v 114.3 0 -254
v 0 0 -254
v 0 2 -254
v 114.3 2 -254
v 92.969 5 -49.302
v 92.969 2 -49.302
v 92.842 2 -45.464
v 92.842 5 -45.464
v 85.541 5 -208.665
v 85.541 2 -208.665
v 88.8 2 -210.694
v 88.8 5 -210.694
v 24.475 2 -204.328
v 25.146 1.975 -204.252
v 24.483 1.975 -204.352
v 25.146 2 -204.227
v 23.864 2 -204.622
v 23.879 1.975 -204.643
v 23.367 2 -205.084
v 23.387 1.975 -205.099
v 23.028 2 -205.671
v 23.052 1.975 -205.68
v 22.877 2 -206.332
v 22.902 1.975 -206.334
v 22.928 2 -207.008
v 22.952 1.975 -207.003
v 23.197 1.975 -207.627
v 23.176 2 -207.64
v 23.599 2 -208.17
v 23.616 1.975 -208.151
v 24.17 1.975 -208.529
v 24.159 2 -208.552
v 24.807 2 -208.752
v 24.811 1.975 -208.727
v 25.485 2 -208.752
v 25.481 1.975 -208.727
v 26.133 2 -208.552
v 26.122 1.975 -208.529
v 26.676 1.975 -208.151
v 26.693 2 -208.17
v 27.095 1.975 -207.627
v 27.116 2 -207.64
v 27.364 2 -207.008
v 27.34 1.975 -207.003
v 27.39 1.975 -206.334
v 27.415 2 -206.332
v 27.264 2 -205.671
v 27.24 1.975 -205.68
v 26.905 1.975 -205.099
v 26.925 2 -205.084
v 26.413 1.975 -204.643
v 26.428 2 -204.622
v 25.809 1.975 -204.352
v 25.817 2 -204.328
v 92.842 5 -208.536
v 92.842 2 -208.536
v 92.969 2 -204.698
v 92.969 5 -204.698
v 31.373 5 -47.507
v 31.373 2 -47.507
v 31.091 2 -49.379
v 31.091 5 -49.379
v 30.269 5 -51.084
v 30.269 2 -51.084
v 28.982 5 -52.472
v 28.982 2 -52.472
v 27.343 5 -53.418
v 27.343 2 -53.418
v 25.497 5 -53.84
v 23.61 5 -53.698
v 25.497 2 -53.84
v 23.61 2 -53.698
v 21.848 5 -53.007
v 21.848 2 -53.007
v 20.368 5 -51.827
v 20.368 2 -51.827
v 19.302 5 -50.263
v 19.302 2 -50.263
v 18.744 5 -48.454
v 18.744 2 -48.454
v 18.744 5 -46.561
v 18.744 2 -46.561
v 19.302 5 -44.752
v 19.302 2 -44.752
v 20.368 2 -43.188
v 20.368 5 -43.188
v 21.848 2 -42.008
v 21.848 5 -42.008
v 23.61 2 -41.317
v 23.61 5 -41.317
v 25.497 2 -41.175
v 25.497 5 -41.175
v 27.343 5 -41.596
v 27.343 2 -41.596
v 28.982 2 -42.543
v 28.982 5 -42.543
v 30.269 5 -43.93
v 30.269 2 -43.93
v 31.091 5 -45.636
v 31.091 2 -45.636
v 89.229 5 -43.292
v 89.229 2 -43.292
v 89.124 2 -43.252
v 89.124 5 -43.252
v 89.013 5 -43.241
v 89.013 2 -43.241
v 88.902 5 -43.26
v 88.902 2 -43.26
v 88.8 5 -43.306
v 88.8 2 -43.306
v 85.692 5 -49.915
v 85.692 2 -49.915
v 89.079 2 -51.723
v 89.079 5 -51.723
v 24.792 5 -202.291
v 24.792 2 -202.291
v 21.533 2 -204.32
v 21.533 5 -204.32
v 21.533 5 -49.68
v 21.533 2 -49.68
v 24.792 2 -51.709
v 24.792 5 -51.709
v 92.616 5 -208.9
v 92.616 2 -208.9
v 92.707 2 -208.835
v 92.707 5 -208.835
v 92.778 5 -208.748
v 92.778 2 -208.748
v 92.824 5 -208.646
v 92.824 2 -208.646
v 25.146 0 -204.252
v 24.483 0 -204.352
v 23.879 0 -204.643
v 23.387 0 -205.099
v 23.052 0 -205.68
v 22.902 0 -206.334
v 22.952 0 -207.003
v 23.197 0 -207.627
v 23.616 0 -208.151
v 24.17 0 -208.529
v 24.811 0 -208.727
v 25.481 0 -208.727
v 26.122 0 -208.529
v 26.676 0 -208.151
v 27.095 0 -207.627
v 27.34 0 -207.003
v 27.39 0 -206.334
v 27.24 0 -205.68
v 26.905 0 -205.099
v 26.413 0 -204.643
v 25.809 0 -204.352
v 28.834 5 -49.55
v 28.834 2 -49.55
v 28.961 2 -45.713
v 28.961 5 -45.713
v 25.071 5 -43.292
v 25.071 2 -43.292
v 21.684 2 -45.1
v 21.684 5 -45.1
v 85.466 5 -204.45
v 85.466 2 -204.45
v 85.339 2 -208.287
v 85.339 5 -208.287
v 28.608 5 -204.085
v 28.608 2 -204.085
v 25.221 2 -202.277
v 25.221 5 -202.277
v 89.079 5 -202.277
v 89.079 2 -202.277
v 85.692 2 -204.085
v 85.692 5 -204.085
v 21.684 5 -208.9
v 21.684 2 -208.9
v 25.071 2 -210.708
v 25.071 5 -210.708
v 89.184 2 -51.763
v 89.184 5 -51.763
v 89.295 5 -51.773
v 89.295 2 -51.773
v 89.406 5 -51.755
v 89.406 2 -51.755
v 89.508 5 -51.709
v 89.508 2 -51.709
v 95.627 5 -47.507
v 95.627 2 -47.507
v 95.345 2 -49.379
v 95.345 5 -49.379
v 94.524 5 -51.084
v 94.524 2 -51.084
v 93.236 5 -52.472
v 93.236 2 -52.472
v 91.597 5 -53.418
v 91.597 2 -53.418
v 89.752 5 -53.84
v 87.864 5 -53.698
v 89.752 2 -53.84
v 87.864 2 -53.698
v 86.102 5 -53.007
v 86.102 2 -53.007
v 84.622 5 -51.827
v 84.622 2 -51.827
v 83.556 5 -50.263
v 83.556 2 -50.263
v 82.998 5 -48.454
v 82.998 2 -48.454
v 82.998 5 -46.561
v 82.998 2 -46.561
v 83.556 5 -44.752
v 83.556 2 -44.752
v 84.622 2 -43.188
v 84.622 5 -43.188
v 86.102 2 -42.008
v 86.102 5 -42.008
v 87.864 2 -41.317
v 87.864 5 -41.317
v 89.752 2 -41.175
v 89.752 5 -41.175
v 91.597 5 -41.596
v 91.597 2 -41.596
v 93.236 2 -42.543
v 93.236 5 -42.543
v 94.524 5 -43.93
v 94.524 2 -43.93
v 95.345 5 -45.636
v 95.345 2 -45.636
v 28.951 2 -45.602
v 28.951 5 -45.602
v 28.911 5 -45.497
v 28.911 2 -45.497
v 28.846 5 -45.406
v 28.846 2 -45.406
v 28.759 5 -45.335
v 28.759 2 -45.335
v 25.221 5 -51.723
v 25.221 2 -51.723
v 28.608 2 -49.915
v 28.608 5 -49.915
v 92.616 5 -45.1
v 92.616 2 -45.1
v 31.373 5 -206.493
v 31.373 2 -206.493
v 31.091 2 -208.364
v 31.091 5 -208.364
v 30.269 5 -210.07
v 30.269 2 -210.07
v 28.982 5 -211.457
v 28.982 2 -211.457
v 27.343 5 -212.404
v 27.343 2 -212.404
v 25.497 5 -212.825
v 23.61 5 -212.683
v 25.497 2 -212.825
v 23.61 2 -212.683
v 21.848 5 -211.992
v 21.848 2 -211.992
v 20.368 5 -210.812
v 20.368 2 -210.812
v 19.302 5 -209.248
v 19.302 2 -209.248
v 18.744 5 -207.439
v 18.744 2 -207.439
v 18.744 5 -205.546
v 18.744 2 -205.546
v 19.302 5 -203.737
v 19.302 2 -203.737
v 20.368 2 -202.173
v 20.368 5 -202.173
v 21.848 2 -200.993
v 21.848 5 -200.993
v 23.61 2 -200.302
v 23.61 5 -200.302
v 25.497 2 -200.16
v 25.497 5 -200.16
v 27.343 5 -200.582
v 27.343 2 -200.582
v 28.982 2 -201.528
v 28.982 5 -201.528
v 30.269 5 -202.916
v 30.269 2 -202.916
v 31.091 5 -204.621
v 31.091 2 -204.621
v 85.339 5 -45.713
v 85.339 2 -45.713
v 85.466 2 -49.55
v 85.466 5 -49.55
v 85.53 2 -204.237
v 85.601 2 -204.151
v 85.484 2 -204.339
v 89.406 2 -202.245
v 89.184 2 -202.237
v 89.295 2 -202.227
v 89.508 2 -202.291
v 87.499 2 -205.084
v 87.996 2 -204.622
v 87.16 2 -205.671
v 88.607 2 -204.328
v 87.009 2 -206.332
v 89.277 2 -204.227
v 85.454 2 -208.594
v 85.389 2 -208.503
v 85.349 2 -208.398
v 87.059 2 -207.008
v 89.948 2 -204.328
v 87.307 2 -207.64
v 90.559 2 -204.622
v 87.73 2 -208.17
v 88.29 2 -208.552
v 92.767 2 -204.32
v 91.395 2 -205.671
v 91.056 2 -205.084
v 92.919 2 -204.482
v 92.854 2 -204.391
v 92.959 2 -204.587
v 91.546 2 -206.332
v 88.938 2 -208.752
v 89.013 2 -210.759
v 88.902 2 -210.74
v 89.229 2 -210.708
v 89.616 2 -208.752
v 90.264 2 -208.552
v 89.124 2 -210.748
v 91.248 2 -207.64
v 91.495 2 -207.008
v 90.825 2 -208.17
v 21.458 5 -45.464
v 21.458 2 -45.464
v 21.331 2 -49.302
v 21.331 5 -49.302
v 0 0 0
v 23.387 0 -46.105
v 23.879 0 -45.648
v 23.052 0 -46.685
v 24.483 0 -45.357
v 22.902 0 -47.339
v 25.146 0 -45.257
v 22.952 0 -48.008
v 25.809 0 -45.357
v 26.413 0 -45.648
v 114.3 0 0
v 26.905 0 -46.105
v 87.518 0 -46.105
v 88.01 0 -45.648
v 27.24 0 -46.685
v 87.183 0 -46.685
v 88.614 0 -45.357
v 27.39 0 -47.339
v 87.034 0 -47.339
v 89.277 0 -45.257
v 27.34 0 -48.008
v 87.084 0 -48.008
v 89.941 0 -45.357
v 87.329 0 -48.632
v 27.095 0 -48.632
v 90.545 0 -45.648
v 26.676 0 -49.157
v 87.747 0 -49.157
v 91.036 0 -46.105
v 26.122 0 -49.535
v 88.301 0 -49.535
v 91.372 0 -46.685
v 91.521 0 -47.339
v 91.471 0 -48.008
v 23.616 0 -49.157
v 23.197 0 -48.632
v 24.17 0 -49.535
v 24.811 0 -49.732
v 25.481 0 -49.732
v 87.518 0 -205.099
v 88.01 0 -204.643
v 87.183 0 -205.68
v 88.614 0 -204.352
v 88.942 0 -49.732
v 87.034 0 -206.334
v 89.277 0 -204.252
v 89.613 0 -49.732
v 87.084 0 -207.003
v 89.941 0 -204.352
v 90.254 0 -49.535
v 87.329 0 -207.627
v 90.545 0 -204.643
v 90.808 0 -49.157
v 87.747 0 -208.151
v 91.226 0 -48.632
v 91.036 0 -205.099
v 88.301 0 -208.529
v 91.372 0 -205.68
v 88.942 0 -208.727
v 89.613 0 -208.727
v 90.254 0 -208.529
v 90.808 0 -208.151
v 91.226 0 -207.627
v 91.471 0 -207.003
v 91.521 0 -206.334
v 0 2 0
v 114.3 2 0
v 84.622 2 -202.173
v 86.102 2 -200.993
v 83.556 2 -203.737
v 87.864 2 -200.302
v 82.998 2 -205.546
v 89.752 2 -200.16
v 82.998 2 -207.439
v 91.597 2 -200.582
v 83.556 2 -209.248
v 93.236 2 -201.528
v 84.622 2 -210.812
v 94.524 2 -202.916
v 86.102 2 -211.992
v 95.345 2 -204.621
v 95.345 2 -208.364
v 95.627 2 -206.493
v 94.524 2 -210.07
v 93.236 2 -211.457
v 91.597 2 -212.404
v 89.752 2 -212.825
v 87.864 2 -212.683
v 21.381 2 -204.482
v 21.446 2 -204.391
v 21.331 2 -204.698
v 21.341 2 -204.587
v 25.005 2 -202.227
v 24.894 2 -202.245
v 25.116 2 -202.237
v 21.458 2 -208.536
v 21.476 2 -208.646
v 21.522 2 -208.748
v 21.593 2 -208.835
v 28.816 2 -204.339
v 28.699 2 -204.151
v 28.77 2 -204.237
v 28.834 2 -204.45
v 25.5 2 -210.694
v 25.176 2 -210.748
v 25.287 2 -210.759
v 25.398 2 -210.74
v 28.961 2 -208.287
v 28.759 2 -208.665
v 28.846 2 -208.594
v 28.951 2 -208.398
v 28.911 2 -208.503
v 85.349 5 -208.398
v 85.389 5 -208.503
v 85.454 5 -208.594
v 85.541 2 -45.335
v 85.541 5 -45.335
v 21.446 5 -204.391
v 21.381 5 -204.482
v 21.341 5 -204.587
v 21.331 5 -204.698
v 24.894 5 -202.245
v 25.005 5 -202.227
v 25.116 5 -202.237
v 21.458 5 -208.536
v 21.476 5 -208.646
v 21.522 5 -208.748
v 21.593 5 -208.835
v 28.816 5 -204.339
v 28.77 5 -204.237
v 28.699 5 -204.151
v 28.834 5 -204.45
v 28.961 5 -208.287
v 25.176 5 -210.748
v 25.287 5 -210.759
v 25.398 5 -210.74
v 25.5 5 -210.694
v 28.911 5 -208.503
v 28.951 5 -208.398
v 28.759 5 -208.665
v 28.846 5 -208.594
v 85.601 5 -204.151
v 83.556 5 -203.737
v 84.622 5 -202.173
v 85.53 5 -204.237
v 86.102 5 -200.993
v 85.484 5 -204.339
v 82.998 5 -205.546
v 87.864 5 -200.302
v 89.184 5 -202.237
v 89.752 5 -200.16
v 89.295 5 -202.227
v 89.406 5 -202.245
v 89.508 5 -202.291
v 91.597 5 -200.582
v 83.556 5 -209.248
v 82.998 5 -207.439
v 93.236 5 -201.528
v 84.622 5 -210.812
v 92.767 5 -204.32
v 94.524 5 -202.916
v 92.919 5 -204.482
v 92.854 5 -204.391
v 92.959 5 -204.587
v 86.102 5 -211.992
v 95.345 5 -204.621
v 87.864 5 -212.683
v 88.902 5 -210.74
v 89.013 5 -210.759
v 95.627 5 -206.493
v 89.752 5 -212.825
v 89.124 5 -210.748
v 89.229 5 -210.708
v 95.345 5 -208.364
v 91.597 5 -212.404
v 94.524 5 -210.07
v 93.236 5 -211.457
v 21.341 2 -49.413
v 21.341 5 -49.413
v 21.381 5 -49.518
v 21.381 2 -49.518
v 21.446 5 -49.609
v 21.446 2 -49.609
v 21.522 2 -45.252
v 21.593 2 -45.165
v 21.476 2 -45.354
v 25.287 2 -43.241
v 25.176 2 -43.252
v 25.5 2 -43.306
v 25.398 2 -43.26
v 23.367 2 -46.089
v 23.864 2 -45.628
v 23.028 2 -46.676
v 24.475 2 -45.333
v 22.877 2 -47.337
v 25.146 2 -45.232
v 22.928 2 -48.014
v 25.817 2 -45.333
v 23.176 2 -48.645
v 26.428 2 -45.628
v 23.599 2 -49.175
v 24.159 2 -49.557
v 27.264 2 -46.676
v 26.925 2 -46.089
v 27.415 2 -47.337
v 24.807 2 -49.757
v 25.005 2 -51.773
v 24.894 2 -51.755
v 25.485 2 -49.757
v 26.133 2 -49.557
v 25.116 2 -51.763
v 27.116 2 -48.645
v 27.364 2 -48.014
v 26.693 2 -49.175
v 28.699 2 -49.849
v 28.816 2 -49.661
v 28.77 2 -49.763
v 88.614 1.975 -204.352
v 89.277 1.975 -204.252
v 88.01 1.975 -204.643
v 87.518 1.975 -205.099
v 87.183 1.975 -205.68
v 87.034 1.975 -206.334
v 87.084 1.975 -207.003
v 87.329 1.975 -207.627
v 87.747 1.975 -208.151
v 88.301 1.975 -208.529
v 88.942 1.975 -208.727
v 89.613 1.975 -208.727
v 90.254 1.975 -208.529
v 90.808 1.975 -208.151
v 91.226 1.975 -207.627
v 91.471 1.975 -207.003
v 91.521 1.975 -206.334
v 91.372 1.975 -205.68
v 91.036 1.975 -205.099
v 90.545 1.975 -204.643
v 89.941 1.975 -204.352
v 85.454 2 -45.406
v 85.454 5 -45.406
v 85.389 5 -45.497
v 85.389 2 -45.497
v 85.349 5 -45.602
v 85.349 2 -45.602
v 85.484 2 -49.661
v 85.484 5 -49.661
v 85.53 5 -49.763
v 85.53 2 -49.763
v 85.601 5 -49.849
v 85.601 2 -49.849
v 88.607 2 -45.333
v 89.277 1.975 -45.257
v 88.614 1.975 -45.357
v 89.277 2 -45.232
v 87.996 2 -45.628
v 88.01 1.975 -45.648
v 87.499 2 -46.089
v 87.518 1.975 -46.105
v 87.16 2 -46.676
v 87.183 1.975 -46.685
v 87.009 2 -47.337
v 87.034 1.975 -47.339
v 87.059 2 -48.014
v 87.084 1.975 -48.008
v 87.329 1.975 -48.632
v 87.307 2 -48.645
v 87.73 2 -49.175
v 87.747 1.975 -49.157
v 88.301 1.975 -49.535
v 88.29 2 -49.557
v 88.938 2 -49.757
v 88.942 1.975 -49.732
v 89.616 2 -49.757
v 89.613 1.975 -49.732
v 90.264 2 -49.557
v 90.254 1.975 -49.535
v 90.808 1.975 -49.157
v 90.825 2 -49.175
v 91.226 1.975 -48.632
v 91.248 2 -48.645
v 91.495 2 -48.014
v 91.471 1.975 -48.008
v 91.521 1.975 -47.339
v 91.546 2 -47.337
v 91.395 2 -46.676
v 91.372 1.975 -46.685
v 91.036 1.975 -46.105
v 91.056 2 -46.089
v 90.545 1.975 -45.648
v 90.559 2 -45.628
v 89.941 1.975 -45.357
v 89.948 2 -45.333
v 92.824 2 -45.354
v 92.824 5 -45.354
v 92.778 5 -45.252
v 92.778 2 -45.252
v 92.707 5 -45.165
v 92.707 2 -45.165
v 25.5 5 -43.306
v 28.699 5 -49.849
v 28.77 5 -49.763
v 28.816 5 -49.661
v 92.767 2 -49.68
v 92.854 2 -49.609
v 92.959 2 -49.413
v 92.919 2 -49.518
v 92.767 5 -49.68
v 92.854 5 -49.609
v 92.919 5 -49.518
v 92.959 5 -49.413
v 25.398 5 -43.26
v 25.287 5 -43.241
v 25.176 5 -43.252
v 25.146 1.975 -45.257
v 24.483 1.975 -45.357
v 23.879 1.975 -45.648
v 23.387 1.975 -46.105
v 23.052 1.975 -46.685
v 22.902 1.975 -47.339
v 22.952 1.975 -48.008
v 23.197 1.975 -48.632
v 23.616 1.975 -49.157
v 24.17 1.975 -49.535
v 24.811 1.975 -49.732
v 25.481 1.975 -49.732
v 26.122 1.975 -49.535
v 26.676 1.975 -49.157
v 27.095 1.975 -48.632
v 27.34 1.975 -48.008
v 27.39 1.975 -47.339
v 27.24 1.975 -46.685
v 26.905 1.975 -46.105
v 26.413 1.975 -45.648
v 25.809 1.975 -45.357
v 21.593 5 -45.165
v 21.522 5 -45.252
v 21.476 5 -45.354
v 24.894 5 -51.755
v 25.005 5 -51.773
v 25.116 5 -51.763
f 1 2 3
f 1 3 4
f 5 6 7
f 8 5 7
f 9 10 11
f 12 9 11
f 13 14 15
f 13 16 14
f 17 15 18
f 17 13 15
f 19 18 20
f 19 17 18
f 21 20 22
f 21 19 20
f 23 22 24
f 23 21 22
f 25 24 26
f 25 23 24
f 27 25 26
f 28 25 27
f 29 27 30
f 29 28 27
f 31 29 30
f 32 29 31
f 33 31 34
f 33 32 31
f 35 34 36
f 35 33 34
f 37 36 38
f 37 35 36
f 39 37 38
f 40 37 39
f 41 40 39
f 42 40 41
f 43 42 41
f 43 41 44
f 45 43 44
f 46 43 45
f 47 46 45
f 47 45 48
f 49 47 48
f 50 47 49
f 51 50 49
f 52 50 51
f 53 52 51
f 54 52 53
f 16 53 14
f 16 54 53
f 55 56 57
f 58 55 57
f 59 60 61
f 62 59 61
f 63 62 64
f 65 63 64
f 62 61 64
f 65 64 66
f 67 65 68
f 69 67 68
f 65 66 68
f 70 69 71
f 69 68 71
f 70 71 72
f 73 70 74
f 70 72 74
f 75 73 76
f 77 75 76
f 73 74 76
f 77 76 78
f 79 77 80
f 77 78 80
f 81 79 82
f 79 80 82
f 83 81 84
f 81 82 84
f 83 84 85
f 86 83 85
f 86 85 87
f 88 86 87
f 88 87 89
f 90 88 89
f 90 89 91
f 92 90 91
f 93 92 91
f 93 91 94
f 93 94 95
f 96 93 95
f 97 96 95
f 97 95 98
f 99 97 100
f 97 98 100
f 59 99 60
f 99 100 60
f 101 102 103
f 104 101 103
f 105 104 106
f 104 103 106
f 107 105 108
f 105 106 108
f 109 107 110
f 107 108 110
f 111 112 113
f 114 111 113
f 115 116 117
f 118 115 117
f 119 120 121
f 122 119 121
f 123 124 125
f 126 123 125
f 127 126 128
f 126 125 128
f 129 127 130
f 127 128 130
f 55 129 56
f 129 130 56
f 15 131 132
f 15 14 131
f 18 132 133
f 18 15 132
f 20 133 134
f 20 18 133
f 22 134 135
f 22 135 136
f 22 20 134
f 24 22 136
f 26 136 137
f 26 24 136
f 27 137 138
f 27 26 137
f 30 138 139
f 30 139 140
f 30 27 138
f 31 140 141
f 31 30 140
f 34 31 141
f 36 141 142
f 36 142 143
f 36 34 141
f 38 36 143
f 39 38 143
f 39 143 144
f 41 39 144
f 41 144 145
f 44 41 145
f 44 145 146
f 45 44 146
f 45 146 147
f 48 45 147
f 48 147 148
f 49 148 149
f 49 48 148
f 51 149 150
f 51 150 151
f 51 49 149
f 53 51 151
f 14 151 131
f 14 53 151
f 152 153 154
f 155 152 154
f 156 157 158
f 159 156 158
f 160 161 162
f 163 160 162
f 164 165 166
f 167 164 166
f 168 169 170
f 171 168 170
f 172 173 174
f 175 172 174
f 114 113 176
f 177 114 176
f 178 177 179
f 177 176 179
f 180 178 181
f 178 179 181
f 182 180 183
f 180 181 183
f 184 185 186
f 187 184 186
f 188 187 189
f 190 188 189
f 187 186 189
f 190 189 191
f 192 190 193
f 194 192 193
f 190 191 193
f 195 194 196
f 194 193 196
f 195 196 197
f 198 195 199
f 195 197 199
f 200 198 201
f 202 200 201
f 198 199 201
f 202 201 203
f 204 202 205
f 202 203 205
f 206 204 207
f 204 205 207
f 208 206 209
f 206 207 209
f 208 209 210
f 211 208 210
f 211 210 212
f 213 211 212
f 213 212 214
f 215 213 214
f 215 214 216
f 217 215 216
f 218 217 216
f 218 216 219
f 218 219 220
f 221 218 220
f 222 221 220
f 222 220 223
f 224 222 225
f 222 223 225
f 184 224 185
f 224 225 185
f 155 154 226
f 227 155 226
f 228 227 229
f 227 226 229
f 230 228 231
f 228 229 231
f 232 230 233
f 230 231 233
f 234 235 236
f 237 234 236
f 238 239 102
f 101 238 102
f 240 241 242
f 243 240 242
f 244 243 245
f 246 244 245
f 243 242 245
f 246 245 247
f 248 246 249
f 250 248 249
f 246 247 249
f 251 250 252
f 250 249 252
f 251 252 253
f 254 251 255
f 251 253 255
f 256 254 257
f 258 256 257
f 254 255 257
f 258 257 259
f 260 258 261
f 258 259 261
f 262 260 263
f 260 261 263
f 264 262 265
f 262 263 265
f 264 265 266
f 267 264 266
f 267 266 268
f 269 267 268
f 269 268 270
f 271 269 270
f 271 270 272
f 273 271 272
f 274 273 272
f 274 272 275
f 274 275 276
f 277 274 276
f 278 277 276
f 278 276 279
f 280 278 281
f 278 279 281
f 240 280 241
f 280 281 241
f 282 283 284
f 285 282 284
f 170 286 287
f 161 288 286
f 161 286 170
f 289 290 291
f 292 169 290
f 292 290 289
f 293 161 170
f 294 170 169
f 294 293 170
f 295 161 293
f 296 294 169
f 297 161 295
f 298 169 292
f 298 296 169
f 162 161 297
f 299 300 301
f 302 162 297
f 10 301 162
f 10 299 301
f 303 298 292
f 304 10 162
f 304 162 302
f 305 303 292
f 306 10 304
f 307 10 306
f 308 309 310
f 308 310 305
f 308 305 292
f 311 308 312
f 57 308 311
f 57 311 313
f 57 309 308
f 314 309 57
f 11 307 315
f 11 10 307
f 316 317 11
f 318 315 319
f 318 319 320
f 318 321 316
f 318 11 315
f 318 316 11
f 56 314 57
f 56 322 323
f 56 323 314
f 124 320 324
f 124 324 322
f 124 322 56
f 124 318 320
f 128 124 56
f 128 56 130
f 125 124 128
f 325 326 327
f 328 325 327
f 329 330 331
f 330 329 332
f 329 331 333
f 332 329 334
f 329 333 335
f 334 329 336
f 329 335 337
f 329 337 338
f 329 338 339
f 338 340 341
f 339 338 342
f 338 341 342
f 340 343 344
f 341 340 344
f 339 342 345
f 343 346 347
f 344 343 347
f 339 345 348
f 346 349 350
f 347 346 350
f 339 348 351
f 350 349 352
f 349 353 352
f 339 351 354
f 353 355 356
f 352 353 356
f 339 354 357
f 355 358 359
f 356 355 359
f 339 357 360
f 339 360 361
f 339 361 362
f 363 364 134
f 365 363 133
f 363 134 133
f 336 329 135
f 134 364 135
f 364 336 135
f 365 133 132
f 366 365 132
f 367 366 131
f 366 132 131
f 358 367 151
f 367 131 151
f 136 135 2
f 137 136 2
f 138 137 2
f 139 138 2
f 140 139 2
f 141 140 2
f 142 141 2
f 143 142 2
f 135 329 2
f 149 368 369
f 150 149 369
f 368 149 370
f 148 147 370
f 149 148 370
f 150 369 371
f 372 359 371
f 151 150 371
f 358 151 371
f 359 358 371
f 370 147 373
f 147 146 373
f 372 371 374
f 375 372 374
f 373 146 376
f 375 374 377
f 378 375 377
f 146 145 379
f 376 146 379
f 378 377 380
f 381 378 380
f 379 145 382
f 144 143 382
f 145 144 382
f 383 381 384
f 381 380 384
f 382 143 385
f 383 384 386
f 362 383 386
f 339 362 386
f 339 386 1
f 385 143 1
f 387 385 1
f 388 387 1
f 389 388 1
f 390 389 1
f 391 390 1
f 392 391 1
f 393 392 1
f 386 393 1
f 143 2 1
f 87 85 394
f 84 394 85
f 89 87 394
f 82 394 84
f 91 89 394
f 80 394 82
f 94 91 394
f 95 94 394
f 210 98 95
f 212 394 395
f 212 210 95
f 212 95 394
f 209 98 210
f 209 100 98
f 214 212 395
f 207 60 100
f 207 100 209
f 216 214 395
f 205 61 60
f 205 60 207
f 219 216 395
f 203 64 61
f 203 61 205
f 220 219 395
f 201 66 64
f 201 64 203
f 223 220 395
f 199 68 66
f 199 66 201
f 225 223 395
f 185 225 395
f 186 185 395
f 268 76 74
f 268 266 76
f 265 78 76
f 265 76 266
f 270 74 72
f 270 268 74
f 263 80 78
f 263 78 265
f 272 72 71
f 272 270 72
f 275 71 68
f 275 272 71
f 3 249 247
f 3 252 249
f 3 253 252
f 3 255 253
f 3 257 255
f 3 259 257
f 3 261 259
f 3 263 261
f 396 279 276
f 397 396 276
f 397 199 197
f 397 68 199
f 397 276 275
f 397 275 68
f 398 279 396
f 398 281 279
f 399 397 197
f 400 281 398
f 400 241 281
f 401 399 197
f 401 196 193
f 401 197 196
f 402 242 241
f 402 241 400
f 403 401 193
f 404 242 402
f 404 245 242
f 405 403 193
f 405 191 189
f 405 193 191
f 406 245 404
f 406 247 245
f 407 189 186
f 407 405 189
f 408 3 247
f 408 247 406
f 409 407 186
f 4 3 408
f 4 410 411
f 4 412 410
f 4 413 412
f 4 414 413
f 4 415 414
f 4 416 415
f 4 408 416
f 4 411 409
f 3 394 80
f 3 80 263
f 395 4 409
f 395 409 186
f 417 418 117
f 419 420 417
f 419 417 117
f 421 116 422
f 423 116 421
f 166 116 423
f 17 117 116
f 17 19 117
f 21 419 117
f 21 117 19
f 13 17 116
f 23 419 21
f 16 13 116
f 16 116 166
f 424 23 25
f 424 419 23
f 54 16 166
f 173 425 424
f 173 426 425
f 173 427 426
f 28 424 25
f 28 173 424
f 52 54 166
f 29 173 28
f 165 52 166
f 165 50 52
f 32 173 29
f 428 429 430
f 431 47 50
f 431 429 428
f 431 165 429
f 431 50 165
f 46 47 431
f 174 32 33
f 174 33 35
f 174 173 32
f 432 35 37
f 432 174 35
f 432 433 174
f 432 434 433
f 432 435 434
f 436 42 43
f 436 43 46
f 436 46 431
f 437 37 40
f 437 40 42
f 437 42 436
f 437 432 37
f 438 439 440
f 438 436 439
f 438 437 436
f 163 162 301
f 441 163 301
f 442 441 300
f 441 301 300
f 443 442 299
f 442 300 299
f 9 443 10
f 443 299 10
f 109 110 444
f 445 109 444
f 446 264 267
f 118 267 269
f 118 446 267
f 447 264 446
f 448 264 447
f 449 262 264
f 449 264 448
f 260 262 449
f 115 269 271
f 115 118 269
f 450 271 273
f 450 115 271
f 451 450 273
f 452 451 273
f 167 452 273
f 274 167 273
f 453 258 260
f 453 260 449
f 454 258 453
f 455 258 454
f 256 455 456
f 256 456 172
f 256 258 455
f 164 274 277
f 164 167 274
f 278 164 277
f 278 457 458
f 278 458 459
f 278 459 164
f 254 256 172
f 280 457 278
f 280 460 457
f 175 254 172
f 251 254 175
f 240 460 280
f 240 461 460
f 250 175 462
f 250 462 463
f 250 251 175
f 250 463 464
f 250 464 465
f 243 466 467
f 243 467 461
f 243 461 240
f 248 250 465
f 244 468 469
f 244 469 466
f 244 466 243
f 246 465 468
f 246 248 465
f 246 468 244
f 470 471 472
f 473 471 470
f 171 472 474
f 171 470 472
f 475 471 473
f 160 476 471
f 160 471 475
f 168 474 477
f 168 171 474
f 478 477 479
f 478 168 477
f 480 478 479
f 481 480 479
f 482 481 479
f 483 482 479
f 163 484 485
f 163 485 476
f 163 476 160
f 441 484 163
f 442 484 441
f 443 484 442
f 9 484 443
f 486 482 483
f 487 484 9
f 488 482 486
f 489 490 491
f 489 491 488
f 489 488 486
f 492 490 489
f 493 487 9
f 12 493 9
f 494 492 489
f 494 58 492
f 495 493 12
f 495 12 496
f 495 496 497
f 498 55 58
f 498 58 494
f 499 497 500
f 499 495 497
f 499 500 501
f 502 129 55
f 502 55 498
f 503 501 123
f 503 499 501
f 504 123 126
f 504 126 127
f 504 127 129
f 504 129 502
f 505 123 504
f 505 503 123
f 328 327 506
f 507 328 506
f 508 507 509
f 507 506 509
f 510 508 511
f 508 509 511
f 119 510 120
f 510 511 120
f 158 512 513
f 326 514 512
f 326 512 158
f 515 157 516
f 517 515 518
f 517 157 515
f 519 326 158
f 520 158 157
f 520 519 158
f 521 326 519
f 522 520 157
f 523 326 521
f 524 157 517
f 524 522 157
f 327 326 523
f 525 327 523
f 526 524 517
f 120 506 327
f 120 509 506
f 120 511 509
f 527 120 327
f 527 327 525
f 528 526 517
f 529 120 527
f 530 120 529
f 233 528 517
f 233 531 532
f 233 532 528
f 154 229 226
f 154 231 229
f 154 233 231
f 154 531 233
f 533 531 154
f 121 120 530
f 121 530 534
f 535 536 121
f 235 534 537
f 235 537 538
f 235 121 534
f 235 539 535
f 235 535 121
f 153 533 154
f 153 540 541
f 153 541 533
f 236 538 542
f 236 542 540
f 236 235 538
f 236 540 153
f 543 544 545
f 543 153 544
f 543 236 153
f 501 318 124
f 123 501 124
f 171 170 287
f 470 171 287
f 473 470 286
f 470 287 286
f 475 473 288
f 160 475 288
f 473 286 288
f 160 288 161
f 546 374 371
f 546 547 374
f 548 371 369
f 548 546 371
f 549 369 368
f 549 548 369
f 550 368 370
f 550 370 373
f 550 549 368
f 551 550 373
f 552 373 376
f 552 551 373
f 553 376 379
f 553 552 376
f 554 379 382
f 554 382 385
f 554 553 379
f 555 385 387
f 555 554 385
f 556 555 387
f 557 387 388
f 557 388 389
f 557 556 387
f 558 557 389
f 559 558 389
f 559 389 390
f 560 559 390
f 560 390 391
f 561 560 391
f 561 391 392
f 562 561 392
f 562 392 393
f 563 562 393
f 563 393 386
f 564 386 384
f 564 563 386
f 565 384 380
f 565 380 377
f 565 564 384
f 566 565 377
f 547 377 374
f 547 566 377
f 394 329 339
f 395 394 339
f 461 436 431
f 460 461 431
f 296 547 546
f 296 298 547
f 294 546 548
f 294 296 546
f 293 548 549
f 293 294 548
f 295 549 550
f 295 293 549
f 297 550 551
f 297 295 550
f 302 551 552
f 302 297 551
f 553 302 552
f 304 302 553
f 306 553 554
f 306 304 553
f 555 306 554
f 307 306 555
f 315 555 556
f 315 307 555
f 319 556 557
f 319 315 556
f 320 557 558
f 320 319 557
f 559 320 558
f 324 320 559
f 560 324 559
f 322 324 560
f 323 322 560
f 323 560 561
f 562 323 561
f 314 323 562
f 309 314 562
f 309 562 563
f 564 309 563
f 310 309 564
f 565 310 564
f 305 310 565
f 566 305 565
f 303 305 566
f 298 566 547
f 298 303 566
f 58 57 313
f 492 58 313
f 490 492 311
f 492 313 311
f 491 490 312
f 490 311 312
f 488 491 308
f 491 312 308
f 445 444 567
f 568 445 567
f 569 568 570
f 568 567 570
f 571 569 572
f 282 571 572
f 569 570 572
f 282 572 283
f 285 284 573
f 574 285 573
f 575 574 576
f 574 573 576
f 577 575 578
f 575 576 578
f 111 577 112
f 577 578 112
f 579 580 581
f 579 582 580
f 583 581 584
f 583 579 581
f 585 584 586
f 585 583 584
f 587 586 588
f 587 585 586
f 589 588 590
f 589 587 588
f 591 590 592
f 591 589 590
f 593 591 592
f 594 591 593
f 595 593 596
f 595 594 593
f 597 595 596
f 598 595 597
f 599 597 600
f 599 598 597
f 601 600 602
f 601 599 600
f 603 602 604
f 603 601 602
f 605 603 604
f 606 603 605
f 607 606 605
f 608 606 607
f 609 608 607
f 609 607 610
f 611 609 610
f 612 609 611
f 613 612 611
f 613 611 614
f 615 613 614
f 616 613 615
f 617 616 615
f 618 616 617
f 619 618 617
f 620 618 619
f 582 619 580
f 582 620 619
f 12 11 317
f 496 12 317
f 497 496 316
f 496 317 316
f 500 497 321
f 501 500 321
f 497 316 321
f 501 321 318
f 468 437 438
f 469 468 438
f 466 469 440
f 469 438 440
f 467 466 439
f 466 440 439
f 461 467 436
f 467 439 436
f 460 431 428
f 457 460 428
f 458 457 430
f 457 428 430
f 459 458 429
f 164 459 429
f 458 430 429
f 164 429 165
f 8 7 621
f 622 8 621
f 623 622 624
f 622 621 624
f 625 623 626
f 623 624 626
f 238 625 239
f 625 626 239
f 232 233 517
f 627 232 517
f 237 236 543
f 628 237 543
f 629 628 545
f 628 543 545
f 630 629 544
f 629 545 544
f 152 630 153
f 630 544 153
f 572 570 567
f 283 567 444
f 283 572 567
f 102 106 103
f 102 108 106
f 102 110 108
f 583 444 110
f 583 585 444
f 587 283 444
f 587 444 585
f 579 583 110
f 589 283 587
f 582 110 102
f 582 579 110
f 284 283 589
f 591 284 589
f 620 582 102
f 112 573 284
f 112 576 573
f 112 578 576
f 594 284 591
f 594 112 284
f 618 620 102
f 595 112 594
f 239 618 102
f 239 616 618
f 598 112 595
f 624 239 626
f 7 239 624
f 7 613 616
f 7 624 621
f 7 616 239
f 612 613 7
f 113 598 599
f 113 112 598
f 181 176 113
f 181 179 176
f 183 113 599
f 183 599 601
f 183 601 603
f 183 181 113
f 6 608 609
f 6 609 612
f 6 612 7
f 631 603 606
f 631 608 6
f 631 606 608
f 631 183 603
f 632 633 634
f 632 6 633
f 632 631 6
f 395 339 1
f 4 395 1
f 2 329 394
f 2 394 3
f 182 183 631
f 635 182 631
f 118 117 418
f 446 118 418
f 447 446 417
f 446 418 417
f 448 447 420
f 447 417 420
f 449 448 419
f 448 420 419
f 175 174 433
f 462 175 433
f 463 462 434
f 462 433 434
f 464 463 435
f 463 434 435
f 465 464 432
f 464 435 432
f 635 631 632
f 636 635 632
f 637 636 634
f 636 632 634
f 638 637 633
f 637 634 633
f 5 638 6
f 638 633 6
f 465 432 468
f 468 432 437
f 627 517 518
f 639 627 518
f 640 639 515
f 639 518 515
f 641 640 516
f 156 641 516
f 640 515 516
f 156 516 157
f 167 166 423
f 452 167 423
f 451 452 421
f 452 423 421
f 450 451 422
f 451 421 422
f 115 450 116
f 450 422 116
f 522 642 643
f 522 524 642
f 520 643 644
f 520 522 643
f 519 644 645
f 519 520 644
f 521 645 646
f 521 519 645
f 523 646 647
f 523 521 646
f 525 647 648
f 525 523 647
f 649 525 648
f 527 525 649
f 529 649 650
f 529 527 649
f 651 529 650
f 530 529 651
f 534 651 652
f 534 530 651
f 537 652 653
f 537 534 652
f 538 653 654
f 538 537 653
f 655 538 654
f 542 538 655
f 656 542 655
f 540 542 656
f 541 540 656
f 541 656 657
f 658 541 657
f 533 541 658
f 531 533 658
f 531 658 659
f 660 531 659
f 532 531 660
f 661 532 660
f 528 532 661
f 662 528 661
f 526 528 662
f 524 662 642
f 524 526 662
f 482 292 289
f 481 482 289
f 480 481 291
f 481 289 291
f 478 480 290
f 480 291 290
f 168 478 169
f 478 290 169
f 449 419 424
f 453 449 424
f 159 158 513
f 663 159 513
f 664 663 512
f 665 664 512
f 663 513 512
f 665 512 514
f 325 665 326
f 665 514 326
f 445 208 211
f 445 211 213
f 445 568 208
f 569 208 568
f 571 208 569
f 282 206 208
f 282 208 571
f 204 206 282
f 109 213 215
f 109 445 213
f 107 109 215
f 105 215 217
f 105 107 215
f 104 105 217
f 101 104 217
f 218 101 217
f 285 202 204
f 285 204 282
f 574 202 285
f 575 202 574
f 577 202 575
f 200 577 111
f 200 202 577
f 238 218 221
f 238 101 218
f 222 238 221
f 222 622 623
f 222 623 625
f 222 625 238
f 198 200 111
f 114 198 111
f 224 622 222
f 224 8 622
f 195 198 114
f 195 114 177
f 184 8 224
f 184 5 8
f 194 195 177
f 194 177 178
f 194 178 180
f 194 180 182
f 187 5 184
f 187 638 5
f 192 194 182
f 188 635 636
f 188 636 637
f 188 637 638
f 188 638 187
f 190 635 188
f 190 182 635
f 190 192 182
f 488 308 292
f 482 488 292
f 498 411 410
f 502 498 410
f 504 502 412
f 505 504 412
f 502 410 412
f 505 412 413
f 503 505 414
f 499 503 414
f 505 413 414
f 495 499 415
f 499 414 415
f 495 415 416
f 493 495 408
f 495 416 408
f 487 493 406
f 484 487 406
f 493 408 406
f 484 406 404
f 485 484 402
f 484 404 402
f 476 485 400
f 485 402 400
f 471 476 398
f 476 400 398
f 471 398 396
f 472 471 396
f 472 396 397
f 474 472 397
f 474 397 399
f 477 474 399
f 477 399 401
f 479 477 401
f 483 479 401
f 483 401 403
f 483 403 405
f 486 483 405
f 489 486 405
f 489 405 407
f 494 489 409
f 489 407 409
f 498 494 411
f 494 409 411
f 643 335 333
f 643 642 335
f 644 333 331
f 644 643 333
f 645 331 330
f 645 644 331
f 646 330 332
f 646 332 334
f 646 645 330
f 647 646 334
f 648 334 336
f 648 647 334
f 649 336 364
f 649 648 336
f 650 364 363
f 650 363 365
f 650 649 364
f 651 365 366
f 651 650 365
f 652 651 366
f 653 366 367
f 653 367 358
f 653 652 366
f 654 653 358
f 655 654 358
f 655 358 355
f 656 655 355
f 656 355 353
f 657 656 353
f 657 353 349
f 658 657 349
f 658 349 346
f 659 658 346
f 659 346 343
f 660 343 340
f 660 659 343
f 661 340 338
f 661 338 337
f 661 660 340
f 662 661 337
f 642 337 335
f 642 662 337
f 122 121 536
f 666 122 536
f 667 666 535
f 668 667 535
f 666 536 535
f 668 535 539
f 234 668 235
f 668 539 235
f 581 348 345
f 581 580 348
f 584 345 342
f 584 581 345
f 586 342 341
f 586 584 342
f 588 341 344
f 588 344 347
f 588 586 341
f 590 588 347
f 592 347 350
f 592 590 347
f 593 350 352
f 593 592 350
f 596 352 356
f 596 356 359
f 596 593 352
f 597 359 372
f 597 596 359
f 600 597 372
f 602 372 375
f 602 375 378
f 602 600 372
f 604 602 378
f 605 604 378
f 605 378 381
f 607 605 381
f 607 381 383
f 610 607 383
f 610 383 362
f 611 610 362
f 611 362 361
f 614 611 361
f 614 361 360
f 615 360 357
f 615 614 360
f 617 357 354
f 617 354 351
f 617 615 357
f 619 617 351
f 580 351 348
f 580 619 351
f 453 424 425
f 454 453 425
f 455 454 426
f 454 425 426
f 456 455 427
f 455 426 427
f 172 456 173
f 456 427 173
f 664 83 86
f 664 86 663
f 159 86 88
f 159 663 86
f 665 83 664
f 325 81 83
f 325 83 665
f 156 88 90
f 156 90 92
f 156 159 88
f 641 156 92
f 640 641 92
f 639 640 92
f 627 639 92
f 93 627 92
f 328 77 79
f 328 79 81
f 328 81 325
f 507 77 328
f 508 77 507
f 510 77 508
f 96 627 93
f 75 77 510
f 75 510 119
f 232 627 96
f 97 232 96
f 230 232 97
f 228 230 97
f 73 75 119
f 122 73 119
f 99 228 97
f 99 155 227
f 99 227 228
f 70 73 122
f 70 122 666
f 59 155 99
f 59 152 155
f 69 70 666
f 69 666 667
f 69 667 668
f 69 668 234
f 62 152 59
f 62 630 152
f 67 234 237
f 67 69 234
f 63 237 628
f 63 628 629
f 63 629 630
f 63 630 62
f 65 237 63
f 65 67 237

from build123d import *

# Parameters (mm, degrees)
SKETCH1_W                     = 114.3
SKETCH1_H                     = 254
BOSS_EXTRUDE1_DEPTH           = 2.000000064
M4_CLEARANCE_HOLE1_AT_2_COUNT = 2
M4_CLEARANCE_HOLE1_AT_2_PITCH = 64.13133097
M4_CLEARANCE_HOLE1_AT_3_COUNT = 2
M4_CLEARANCE_HOLE1_AT_3_PITCH = 171.44126128
M4_CLEARANCE_HOLE1_AT_4_COUNT = 2
M4_CLEARANCE_HOLE1_AT_4_PITCH = 158.994586252
SKETCH8_R                     = 6.35
BOSS_EXTRUDE3_DEPTH           = 3


with BuildPart() as part:
    # Sketch1 → Boss-Extrude1 (new body)
    with BuildSketch(Plane(origin=(0, 0, 0), x_dir=(1, 0, 0), z_dir=(0, 1, 0))):
        with Locations((57.15, 127)):
            Rectangle(SKETCH1_W, SKETCH1_H)
    extrude(amount=BOSS_EXTRUDE1_DEPTH)

    # Sketch6 → M4 Clearance Hole1 (revolve, cut)
    with BuildSketch(Plane(origin=(25.146, 2.000000064, -206.502), x_dir=(0, 0, 1), z_dir=(1, 0, 0))):
        Polygon((0, 0), (0, 2.000000064), (2.25, 2.000000064), (2.25, 0.025), (2.275, 0), align=None)
    m4_clearance_hole1 = revolve(axis=Axis((25.146, 8.350000064, -206.502), (0, -1, 0)), mode=Mode.SUBTRACT)

    # M4 Clearance Hole1 at 2: M4 Clearance Hole1 ×2
    with Locations(*[(i * M4_CLEARANCE_HOLE1_AT_2_PITCH, 0, 0) for i in range(1, M4_CLEARANCE_HOLE1_AT_2_COUNT)]):
        add(m4_clearance_hole1, mode=Mode.SUBTRACT)

    # M4 Clearance Hole1 at 3: M4 Clearance Hole1 ×2
    with Locations(*[Vector(0.37407174, 0, 0.92739977) * (i * M4_CLEARANCE_HOLE1_AT_3_PITCH) for i in range(1, M4_CLEARANCE_HOLE1_AT_3_COUNT)]):
        add(m4_clearance_hole1, mode=Mode.SUBTRACT)

    # M4 Clearance Hole1 at 4: M4 Clearance Hole1 ×2
    with Locations(*[(0, 0, i * M4_CLEARANCE_HOLE1_AT_4_PITCH) for i in range(1, M4_CLEARANCE_HOLE1_AT_4_COUNT)]):
        add(m4_clearance_hole1, mode=Mode.SUBTRACT)

    # Sketch8 → Boss-Extrude3 (add)
    with BuildSketch(Plane(origin=(0, 2.000000064, 0), x_dir=(1, 0, 0), z_dir=(0, 1, 0))):
        with Locations((89.27733097, 47.507413748)):
            Circle(SKETCH8_R)
        with BuildLine():
            ThreePointArc((89.228972354, 43.291716477), (89.012687116, 43.241374316), (88.800207525, 43.305919345))
            Line((88.800207525, 43.305919345), (85.540585246, 45.334637149))
            ThreePointArc((85.540585246, 45.334637149), (85.388845037, 45.496774579), (85.338502876, 45.713059817))
            Line((85.338502876, 45.713059817), (85.465612892, 49.55033442))
            ThreePointArc((85.465612892, 49.55033442), (85.53015792, 49.762814011), (85.692295351, 49.91455422))
            Line((85.692295351, 49.91455422), (89.079027646, 51.723111019))
            ThreePointArc((89.079027646, 51.723111019), (89.295312884, 51.77345318), (89.507792475, 51.708908151))
            Line((89.507792475, 51.708908151), (92.767414754, 49.680190347))
            ThreePointArc((92.767414754, 49.680190347), (92.919154963, 49.518052917), (92.969497124, 49.301767679))
            Line((92.969497124, 49.301767679), (92.842387108, 45.464493076))
            ThreePointArc((92.842387108, 45.464493076), (92.77784208, 45.252013485), (92.615704649, 45.100273276))
            Line((92.615704649, 45.100273276), (89.228972354, 43.291716477))
        make_face(mode=Mode.SUBTRACT)
        with Locations((25.02266903, 47.507413748)):
            Circle(SKETCH8_R)
        with BuildLine():
            Line((28.759414754, 45.334637149), (25.499792475, 43.305919345))
            ThreePointArc((25.499792475, 43.305919345), (25.287312884, 43.241374316), (25.071027646, 43.291716477))
            Line((25.071027646, 43.291716477), (21.684295351, 45.100273276))
            ThreePointArc((21.684295351, 45.100273276), (21.52215792, 45.252013485), (21.457612892, 45.464493076))
            Line((21.457612892, 45.464493076), (21.330502876, 49.301767679))
            ThreePointArc((21.330502876, 49.301767679), (21.380845037, 49.518052917), (21.532585246, 49.680190347))
            Line((21.532585246, 49.680190347), (24.792207525, 51.708908151))
            ThreePointArc((24.792207525, 51.708908151), (25.004687116, 51.77345318), (25.220972354, 51.723111019))
            Line((25.220972354, 51.723111019), (28.607704649, 49.91455422))
            ThreePointArc((28.607704649, 49.91455422), (28.76984208, 49.762814011), (28.834387108, 49.55033442))
            Line((28.834387108, 49.55033442), (28.961497124, 45.713059817))
            ThreePointArc((28.961497124, 45.713059817), (28.911154963, 45.496774579), (28.759414754, 45.334637149))
        make_face(mode=Mode.SUBTRACT)
        with Locations((89.27733097, 206.492586252)):
            Circle(SKETCH8_R)
        with BuildLine():
            Line((89.228972354, 210.708283523), (92.615704649, 208.899726724))
            ThreePointArc((92.615704649, 208.899726724), (92.77784208, 208.747986515), (92.842387108, 208.535506924))
            Line((92.842387108, 208.535506924), (92.969497124, 204.698232321))
            ThreePointArc((92.969497124, 204.698232321), (92.919154963, 204.481947083), (92.767414754, 204.319809653))
            Line((92.767414754, 204.319809653), (89.507792475, 202.291091849))
            ThreePointArc((89.507792475, 202.291091849), (89.295312884, 202.22654682), (89.079027646, 202.276888981))
            Line((89.079027646, 202.276888981), (85.692295351, 204.08544578))
            ThreePointArc((85.692295351, 204.08544578), (85.53015792, 204.237185989), (85.465612892, 204.44966558))
            Line((85.465612892, 204.44966558), (85.338502876, 208.286940183))
            ThreePointArc((85.338502876, 208.286940183), (85.388845037, 208.503225421), (85.540585246, 208.665362851))
            Line((85.540585246, 208.665362851), (88.800207525, 210.694080655))
            ThreePointArc((88.800207525, 210.694080655), (89.012687116, 210.758625684), (89.228972354, 210.708283523))
        make_face(mode=Mode.SUBTRACT)
        with Locations((25.02266903, 206.492586252)):
            Circle(SKETCH8_R)
        with BuildLine():
            ThreePointArc((25.071027646, 210.708283523), (25.287312884, 210.758625684), (25.499792475, 210.694080655))
            Line((25.499792475, 210.694080655), (28.759414754, 208.665362851))
            ThreePointArc((28.759414754, 208.665362851), (28.911154963, 208.503225421), (28.961497124, 208.286940183))
            Line((28.961497124, 208.286940183), (28.834387108, 204.44966558))
            ThreePointArc((28.834387108, 204.44966558), (28.76984208, 204.237185989), (28.607704649, 204.08544578))
            Line((28.607704649, 204.08544578), (25.220972354, 202.276888981))
            ThreePointArc((25.220972354, 202.276888981), (25.004687116, 202.22654682), (24.792207525, 202.291091849))
            Line((24.792207525, 202.291091849), (21.532585246, 204.319809653))
            ThreePointArc((21.532585246, 204.319809653), (21.380845037, 204.481947083), (21.330502876, 204.698232321))
            Line((21.330502876, 204.698232321), (21.457612892, 208.535506924))
            ThreePointArc((21.457612892, 208.535506924), (21.52215792, 208.747986515), (21.684295351, 208.899726724))
            Line((21.684295351, 208.899726724), (25.071027646, 210.708283523))
        make_face(mode=Mode.SUBTRACT)
    extrude(amount=BOSS_EXTRUDE3_DEPTH)


solid = part.part
